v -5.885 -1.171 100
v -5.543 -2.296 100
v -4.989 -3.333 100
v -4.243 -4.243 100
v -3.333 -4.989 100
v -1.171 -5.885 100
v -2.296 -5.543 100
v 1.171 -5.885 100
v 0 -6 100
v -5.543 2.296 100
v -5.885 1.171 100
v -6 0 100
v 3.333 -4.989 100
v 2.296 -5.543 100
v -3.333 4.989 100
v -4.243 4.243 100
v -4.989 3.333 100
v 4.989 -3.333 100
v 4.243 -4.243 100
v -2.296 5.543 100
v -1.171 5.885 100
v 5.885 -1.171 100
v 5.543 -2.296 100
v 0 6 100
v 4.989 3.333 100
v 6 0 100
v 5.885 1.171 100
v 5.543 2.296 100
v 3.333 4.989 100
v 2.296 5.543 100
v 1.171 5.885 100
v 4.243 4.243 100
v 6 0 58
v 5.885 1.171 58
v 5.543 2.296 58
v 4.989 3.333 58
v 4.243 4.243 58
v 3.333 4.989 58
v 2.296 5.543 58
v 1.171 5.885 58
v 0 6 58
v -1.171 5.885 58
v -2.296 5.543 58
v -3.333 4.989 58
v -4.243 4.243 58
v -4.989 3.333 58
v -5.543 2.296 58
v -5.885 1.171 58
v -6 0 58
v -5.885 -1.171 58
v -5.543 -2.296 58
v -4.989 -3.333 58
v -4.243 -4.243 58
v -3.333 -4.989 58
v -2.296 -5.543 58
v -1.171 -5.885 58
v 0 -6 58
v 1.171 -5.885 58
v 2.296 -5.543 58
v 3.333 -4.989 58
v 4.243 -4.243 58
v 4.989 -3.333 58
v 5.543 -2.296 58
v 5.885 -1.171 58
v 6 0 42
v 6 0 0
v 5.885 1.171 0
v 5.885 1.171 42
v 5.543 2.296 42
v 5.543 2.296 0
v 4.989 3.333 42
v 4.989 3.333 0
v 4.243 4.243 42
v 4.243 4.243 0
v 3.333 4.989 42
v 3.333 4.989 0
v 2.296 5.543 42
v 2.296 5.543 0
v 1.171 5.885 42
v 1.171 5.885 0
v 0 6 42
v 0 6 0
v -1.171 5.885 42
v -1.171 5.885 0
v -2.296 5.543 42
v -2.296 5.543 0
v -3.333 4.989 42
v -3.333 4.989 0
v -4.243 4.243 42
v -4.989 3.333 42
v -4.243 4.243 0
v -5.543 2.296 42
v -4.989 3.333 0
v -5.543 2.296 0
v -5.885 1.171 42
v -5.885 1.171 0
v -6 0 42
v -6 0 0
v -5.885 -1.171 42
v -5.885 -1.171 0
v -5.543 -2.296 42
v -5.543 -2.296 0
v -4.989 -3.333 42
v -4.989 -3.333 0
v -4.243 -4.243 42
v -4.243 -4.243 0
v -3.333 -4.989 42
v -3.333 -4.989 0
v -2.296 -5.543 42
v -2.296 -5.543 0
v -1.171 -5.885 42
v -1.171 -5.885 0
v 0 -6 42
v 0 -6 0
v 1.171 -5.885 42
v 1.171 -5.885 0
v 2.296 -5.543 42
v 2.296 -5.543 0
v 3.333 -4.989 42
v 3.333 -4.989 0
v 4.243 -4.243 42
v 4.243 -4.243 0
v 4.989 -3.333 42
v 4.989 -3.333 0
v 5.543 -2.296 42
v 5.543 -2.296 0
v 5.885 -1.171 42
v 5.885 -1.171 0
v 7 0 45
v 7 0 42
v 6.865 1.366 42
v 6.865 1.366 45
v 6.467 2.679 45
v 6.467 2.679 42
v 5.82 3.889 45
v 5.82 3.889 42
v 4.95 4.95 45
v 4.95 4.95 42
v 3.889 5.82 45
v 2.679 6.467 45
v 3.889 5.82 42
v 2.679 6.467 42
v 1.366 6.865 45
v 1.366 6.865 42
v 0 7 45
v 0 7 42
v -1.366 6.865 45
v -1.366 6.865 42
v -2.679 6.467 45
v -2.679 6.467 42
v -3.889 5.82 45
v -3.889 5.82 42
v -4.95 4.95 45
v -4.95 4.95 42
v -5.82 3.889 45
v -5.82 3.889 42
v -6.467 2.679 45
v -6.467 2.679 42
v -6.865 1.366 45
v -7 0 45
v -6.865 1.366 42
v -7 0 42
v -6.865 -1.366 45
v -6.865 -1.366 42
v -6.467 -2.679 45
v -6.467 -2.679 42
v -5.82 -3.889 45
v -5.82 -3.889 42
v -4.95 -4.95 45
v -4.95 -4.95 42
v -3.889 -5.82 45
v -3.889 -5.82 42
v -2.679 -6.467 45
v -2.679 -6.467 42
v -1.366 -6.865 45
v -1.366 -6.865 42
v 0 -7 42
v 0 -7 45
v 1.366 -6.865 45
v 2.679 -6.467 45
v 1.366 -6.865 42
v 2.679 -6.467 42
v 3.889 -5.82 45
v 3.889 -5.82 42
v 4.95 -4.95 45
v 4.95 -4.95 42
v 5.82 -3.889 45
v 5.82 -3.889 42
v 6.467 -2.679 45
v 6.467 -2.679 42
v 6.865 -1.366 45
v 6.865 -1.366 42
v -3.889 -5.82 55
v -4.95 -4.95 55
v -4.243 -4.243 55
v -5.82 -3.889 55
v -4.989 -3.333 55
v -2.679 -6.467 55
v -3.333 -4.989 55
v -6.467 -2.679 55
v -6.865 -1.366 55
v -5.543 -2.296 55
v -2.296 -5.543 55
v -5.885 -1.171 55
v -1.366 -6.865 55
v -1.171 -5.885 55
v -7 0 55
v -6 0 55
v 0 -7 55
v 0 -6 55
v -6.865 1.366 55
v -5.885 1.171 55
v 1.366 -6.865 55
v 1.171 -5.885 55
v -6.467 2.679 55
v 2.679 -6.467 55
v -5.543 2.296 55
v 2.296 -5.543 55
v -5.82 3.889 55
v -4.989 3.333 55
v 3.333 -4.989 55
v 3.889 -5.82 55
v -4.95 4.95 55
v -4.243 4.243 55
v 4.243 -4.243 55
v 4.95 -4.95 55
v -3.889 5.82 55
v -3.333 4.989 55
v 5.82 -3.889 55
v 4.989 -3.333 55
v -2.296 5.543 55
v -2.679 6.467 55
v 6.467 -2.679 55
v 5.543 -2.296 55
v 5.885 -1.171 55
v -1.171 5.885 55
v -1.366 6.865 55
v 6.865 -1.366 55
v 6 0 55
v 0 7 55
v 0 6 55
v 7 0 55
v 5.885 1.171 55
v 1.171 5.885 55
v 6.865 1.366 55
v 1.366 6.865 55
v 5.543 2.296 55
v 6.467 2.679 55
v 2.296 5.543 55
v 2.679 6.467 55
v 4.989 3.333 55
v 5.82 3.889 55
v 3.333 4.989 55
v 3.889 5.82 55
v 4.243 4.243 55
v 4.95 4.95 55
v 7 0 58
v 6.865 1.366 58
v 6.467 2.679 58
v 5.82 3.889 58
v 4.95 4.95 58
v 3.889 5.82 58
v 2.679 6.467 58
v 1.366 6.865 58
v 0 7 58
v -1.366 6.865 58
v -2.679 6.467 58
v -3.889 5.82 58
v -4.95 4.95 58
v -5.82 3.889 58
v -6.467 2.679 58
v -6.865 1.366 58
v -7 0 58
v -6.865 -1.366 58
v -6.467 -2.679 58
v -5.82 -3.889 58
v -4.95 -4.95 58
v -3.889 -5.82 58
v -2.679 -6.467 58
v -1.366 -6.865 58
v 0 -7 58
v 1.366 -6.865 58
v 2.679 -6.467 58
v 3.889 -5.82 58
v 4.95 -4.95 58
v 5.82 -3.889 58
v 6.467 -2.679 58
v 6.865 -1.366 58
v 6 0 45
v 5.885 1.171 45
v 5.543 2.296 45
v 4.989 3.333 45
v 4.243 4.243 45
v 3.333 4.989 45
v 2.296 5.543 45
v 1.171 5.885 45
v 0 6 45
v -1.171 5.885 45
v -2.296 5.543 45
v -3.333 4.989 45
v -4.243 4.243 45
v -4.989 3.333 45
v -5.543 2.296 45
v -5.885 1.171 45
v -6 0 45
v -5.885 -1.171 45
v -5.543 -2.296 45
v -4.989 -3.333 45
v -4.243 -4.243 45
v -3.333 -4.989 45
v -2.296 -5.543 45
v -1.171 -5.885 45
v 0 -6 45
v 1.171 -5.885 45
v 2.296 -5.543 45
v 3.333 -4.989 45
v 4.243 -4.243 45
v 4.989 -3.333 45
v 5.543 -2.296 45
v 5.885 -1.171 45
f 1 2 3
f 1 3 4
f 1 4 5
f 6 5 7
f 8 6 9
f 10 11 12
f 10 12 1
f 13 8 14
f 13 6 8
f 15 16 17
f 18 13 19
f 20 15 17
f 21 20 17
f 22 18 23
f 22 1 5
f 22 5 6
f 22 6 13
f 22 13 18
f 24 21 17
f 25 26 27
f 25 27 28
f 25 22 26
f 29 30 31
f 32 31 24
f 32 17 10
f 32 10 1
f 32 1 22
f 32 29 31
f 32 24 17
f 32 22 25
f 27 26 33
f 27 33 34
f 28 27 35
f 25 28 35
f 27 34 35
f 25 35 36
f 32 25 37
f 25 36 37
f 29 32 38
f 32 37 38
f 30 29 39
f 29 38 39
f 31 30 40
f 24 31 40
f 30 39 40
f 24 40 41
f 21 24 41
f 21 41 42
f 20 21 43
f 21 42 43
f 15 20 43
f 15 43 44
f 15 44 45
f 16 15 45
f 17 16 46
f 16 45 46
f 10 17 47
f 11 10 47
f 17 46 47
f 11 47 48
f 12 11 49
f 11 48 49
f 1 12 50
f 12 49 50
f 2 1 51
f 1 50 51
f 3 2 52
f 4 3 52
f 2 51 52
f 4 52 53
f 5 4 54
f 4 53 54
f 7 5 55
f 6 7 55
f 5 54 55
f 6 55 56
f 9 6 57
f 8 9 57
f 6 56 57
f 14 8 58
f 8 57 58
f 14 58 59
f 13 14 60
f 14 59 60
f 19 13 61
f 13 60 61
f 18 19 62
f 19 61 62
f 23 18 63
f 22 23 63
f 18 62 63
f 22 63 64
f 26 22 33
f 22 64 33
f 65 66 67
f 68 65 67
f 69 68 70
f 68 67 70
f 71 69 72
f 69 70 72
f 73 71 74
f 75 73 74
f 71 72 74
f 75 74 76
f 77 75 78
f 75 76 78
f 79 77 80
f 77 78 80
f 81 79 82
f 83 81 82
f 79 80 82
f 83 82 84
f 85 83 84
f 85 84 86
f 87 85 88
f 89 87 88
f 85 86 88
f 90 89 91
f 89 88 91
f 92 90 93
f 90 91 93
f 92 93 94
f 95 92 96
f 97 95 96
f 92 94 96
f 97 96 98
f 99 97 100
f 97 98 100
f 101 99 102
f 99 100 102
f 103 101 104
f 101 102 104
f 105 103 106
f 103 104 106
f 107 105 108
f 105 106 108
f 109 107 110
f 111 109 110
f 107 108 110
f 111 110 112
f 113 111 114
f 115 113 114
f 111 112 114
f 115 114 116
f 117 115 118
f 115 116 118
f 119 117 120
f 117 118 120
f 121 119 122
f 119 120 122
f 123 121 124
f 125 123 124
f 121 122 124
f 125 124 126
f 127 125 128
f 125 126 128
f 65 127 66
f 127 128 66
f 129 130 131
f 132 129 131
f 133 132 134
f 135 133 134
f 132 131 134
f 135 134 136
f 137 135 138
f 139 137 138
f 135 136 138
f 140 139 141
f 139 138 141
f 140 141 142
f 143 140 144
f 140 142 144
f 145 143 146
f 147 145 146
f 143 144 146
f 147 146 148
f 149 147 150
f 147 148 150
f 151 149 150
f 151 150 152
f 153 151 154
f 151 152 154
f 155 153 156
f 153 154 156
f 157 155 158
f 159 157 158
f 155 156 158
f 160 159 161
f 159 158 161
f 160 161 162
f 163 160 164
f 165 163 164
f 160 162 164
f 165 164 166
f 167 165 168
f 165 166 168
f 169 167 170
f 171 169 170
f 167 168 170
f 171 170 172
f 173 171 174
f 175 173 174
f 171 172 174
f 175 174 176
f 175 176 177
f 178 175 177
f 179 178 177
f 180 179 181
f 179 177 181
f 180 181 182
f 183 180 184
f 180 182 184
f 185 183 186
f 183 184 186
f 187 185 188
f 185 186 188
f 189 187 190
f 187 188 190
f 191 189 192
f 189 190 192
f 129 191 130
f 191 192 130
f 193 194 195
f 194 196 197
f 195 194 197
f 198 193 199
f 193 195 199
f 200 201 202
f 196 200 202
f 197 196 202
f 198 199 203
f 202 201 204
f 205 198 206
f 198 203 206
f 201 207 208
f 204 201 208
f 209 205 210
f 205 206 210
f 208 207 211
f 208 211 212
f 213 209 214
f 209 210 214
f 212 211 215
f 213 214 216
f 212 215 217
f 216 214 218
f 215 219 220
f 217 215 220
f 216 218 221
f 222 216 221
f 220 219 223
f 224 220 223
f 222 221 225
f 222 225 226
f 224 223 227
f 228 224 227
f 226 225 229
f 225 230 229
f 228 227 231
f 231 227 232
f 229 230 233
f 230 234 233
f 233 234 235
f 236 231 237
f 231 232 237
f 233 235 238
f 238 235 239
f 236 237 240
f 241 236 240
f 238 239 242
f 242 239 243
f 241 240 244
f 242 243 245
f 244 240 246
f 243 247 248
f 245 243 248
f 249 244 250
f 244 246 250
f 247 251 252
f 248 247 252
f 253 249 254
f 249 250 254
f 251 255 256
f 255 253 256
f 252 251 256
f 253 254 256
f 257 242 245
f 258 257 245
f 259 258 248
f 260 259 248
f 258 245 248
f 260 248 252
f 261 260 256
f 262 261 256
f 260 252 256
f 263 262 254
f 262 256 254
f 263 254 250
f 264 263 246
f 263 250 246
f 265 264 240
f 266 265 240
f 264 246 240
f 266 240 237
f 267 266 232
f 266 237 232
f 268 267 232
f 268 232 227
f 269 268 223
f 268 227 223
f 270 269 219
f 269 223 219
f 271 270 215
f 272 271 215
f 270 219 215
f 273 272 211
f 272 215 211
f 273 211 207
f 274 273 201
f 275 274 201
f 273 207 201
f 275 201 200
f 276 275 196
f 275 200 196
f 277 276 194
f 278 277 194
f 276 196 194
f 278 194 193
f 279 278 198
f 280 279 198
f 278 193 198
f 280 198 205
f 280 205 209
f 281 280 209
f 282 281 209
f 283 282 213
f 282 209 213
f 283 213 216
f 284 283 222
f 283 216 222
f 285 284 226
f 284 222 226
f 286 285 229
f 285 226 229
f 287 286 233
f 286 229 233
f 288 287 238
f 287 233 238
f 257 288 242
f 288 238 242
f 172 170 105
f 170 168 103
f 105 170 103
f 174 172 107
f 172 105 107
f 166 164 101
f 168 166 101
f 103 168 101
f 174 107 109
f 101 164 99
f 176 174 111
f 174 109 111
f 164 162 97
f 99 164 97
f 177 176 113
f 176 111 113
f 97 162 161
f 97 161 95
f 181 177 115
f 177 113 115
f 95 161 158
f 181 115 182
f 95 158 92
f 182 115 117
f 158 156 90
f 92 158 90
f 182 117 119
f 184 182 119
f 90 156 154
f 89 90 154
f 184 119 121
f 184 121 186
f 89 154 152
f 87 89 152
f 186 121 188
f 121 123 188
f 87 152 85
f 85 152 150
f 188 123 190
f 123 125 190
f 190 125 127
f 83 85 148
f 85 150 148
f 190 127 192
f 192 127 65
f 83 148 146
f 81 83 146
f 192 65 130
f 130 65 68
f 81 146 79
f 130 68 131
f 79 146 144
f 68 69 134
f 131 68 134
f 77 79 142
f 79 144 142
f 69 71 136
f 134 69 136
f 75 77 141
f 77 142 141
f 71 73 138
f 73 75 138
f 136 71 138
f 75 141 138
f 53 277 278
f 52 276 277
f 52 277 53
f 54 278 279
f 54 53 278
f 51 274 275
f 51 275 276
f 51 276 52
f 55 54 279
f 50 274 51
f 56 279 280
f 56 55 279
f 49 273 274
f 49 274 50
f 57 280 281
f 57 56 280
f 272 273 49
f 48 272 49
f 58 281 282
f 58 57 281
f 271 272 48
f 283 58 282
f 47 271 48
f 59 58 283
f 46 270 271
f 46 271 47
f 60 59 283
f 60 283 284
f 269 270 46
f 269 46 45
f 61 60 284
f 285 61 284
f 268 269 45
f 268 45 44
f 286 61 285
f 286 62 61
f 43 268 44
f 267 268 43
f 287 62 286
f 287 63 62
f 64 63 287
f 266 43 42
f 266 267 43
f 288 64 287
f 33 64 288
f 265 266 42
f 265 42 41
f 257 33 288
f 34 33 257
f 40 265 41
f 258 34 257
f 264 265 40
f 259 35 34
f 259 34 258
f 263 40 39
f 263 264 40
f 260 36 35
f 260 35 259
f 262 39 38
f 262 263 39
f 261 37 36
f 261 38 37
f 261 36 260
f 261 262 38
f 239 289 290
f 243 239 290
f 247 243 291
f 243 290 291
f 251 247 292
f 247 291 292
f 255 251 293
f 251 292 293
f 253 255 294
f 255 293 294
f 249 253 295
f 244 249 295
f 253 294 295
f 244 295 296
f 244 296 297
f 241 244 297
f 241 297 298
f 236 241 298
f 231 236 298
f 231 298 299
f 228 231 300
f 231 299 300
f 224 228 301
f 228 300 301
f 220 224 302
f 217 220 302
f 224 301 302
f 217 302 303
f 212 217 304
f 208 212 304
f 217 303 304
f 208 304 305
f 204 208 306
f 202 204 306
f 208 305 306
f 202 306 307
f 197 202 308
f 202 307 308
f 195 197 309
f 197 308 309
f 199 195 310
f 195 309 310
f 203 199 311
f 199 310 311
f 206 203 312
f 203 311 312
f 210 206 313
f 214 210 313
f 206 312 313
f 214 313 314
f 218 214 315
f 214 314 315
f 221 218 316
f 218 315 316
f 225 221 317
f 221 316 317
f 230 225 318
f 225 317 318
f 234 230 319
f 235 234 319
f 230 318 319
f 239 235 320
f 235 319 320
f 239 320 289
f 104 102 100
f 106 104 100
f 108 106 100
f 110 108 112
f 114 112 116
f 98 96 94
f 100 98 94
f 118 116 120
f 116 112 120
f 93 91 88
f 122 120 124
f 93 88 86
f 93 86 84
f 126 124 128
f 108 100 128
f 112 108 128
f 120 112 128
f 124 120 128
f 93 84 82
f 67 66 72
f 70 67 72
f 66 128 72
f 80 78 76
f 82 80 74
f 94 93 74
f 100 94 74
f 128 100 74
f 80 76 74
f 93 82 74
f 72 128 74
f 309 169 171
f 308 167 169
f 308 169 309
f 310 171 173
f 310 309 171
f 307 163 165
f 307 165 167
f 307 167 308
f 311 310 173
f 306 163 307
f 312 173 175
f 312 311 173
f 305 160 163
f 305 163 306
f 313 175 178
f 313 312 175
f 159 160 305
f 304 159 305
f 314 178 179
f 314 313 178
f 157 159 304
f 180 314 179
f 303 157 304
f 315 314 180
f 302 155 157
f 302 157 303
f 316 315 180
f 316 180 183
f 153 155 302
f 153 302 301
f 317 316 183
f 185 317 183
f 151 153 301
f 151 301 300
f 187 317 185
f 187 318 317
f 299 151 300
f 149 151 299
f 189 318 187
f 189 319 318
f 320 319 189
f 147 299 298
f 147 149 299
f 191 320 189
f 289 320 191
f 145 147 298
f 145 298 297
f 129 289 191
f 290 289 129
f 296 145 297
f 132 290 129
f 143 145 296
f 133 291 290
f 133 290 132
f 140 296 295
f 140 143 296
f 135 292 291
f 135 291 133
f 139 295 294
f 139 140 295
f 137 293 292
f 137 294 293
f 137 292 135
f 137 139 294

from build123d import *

# Parameters (mm, degrees)
SKETCH1_R           = 6
BOSS_EXTRUDE1_DEPTH = 42
SKETCH2_R           = 7
BOSS_EXTRUDE2_DEPTH = 3
SKETCH3_R           = 6
BOSS_EXTRUDE3_DEPTH = 10
SKETCH4_R           = 7
BOSS_EXTRUDE4_DEPTH = 3
SKETCH5_R           = 6
BOSS_EXTRUDE5_DEPTH = 42


with BuildPart() as part:
    # Sketch1 → Boss-Extrude1 (new body)
    with BuildSketch(Plane.XY):
        Circle(SKETCH1_R)
    extrude(amount=BOSS_EXTRUDE1_DEPTH)

    # Sketch2 → Boss-Extrude2 (add)
    with BuildSketch(Plane.XY.offset(42)):
        Circle(SKETCH2_R)
    extrude(amount=BOSS_EXTRUDE2_DEPTH)

    # Sketch3 → Boss-Extrude3 (add)
    with BuildSketch(Plane.XY.offset(45)):
        Circle(SKETCH3_R)
    extrude(amount=BOSS_EXTRUDE3_DEPTH)

    # Sketch4 → Boss-Extrude4 (add)
    with BuildSketch(Plane.XY.offset(55)):
        Circle(SKETCH4_R)
    extrude(amount=BOSS_EXTRUDE4_DEPTH)

    # Sketch5 → Boss-Extrude5 (add)
    with BuildSketch(Plane.XY.offset(58)):
        Circle(SKETCH5_R)
    extrude(amount=BOSS_EXTRUDE5_DEPTH)


solid = part.part
